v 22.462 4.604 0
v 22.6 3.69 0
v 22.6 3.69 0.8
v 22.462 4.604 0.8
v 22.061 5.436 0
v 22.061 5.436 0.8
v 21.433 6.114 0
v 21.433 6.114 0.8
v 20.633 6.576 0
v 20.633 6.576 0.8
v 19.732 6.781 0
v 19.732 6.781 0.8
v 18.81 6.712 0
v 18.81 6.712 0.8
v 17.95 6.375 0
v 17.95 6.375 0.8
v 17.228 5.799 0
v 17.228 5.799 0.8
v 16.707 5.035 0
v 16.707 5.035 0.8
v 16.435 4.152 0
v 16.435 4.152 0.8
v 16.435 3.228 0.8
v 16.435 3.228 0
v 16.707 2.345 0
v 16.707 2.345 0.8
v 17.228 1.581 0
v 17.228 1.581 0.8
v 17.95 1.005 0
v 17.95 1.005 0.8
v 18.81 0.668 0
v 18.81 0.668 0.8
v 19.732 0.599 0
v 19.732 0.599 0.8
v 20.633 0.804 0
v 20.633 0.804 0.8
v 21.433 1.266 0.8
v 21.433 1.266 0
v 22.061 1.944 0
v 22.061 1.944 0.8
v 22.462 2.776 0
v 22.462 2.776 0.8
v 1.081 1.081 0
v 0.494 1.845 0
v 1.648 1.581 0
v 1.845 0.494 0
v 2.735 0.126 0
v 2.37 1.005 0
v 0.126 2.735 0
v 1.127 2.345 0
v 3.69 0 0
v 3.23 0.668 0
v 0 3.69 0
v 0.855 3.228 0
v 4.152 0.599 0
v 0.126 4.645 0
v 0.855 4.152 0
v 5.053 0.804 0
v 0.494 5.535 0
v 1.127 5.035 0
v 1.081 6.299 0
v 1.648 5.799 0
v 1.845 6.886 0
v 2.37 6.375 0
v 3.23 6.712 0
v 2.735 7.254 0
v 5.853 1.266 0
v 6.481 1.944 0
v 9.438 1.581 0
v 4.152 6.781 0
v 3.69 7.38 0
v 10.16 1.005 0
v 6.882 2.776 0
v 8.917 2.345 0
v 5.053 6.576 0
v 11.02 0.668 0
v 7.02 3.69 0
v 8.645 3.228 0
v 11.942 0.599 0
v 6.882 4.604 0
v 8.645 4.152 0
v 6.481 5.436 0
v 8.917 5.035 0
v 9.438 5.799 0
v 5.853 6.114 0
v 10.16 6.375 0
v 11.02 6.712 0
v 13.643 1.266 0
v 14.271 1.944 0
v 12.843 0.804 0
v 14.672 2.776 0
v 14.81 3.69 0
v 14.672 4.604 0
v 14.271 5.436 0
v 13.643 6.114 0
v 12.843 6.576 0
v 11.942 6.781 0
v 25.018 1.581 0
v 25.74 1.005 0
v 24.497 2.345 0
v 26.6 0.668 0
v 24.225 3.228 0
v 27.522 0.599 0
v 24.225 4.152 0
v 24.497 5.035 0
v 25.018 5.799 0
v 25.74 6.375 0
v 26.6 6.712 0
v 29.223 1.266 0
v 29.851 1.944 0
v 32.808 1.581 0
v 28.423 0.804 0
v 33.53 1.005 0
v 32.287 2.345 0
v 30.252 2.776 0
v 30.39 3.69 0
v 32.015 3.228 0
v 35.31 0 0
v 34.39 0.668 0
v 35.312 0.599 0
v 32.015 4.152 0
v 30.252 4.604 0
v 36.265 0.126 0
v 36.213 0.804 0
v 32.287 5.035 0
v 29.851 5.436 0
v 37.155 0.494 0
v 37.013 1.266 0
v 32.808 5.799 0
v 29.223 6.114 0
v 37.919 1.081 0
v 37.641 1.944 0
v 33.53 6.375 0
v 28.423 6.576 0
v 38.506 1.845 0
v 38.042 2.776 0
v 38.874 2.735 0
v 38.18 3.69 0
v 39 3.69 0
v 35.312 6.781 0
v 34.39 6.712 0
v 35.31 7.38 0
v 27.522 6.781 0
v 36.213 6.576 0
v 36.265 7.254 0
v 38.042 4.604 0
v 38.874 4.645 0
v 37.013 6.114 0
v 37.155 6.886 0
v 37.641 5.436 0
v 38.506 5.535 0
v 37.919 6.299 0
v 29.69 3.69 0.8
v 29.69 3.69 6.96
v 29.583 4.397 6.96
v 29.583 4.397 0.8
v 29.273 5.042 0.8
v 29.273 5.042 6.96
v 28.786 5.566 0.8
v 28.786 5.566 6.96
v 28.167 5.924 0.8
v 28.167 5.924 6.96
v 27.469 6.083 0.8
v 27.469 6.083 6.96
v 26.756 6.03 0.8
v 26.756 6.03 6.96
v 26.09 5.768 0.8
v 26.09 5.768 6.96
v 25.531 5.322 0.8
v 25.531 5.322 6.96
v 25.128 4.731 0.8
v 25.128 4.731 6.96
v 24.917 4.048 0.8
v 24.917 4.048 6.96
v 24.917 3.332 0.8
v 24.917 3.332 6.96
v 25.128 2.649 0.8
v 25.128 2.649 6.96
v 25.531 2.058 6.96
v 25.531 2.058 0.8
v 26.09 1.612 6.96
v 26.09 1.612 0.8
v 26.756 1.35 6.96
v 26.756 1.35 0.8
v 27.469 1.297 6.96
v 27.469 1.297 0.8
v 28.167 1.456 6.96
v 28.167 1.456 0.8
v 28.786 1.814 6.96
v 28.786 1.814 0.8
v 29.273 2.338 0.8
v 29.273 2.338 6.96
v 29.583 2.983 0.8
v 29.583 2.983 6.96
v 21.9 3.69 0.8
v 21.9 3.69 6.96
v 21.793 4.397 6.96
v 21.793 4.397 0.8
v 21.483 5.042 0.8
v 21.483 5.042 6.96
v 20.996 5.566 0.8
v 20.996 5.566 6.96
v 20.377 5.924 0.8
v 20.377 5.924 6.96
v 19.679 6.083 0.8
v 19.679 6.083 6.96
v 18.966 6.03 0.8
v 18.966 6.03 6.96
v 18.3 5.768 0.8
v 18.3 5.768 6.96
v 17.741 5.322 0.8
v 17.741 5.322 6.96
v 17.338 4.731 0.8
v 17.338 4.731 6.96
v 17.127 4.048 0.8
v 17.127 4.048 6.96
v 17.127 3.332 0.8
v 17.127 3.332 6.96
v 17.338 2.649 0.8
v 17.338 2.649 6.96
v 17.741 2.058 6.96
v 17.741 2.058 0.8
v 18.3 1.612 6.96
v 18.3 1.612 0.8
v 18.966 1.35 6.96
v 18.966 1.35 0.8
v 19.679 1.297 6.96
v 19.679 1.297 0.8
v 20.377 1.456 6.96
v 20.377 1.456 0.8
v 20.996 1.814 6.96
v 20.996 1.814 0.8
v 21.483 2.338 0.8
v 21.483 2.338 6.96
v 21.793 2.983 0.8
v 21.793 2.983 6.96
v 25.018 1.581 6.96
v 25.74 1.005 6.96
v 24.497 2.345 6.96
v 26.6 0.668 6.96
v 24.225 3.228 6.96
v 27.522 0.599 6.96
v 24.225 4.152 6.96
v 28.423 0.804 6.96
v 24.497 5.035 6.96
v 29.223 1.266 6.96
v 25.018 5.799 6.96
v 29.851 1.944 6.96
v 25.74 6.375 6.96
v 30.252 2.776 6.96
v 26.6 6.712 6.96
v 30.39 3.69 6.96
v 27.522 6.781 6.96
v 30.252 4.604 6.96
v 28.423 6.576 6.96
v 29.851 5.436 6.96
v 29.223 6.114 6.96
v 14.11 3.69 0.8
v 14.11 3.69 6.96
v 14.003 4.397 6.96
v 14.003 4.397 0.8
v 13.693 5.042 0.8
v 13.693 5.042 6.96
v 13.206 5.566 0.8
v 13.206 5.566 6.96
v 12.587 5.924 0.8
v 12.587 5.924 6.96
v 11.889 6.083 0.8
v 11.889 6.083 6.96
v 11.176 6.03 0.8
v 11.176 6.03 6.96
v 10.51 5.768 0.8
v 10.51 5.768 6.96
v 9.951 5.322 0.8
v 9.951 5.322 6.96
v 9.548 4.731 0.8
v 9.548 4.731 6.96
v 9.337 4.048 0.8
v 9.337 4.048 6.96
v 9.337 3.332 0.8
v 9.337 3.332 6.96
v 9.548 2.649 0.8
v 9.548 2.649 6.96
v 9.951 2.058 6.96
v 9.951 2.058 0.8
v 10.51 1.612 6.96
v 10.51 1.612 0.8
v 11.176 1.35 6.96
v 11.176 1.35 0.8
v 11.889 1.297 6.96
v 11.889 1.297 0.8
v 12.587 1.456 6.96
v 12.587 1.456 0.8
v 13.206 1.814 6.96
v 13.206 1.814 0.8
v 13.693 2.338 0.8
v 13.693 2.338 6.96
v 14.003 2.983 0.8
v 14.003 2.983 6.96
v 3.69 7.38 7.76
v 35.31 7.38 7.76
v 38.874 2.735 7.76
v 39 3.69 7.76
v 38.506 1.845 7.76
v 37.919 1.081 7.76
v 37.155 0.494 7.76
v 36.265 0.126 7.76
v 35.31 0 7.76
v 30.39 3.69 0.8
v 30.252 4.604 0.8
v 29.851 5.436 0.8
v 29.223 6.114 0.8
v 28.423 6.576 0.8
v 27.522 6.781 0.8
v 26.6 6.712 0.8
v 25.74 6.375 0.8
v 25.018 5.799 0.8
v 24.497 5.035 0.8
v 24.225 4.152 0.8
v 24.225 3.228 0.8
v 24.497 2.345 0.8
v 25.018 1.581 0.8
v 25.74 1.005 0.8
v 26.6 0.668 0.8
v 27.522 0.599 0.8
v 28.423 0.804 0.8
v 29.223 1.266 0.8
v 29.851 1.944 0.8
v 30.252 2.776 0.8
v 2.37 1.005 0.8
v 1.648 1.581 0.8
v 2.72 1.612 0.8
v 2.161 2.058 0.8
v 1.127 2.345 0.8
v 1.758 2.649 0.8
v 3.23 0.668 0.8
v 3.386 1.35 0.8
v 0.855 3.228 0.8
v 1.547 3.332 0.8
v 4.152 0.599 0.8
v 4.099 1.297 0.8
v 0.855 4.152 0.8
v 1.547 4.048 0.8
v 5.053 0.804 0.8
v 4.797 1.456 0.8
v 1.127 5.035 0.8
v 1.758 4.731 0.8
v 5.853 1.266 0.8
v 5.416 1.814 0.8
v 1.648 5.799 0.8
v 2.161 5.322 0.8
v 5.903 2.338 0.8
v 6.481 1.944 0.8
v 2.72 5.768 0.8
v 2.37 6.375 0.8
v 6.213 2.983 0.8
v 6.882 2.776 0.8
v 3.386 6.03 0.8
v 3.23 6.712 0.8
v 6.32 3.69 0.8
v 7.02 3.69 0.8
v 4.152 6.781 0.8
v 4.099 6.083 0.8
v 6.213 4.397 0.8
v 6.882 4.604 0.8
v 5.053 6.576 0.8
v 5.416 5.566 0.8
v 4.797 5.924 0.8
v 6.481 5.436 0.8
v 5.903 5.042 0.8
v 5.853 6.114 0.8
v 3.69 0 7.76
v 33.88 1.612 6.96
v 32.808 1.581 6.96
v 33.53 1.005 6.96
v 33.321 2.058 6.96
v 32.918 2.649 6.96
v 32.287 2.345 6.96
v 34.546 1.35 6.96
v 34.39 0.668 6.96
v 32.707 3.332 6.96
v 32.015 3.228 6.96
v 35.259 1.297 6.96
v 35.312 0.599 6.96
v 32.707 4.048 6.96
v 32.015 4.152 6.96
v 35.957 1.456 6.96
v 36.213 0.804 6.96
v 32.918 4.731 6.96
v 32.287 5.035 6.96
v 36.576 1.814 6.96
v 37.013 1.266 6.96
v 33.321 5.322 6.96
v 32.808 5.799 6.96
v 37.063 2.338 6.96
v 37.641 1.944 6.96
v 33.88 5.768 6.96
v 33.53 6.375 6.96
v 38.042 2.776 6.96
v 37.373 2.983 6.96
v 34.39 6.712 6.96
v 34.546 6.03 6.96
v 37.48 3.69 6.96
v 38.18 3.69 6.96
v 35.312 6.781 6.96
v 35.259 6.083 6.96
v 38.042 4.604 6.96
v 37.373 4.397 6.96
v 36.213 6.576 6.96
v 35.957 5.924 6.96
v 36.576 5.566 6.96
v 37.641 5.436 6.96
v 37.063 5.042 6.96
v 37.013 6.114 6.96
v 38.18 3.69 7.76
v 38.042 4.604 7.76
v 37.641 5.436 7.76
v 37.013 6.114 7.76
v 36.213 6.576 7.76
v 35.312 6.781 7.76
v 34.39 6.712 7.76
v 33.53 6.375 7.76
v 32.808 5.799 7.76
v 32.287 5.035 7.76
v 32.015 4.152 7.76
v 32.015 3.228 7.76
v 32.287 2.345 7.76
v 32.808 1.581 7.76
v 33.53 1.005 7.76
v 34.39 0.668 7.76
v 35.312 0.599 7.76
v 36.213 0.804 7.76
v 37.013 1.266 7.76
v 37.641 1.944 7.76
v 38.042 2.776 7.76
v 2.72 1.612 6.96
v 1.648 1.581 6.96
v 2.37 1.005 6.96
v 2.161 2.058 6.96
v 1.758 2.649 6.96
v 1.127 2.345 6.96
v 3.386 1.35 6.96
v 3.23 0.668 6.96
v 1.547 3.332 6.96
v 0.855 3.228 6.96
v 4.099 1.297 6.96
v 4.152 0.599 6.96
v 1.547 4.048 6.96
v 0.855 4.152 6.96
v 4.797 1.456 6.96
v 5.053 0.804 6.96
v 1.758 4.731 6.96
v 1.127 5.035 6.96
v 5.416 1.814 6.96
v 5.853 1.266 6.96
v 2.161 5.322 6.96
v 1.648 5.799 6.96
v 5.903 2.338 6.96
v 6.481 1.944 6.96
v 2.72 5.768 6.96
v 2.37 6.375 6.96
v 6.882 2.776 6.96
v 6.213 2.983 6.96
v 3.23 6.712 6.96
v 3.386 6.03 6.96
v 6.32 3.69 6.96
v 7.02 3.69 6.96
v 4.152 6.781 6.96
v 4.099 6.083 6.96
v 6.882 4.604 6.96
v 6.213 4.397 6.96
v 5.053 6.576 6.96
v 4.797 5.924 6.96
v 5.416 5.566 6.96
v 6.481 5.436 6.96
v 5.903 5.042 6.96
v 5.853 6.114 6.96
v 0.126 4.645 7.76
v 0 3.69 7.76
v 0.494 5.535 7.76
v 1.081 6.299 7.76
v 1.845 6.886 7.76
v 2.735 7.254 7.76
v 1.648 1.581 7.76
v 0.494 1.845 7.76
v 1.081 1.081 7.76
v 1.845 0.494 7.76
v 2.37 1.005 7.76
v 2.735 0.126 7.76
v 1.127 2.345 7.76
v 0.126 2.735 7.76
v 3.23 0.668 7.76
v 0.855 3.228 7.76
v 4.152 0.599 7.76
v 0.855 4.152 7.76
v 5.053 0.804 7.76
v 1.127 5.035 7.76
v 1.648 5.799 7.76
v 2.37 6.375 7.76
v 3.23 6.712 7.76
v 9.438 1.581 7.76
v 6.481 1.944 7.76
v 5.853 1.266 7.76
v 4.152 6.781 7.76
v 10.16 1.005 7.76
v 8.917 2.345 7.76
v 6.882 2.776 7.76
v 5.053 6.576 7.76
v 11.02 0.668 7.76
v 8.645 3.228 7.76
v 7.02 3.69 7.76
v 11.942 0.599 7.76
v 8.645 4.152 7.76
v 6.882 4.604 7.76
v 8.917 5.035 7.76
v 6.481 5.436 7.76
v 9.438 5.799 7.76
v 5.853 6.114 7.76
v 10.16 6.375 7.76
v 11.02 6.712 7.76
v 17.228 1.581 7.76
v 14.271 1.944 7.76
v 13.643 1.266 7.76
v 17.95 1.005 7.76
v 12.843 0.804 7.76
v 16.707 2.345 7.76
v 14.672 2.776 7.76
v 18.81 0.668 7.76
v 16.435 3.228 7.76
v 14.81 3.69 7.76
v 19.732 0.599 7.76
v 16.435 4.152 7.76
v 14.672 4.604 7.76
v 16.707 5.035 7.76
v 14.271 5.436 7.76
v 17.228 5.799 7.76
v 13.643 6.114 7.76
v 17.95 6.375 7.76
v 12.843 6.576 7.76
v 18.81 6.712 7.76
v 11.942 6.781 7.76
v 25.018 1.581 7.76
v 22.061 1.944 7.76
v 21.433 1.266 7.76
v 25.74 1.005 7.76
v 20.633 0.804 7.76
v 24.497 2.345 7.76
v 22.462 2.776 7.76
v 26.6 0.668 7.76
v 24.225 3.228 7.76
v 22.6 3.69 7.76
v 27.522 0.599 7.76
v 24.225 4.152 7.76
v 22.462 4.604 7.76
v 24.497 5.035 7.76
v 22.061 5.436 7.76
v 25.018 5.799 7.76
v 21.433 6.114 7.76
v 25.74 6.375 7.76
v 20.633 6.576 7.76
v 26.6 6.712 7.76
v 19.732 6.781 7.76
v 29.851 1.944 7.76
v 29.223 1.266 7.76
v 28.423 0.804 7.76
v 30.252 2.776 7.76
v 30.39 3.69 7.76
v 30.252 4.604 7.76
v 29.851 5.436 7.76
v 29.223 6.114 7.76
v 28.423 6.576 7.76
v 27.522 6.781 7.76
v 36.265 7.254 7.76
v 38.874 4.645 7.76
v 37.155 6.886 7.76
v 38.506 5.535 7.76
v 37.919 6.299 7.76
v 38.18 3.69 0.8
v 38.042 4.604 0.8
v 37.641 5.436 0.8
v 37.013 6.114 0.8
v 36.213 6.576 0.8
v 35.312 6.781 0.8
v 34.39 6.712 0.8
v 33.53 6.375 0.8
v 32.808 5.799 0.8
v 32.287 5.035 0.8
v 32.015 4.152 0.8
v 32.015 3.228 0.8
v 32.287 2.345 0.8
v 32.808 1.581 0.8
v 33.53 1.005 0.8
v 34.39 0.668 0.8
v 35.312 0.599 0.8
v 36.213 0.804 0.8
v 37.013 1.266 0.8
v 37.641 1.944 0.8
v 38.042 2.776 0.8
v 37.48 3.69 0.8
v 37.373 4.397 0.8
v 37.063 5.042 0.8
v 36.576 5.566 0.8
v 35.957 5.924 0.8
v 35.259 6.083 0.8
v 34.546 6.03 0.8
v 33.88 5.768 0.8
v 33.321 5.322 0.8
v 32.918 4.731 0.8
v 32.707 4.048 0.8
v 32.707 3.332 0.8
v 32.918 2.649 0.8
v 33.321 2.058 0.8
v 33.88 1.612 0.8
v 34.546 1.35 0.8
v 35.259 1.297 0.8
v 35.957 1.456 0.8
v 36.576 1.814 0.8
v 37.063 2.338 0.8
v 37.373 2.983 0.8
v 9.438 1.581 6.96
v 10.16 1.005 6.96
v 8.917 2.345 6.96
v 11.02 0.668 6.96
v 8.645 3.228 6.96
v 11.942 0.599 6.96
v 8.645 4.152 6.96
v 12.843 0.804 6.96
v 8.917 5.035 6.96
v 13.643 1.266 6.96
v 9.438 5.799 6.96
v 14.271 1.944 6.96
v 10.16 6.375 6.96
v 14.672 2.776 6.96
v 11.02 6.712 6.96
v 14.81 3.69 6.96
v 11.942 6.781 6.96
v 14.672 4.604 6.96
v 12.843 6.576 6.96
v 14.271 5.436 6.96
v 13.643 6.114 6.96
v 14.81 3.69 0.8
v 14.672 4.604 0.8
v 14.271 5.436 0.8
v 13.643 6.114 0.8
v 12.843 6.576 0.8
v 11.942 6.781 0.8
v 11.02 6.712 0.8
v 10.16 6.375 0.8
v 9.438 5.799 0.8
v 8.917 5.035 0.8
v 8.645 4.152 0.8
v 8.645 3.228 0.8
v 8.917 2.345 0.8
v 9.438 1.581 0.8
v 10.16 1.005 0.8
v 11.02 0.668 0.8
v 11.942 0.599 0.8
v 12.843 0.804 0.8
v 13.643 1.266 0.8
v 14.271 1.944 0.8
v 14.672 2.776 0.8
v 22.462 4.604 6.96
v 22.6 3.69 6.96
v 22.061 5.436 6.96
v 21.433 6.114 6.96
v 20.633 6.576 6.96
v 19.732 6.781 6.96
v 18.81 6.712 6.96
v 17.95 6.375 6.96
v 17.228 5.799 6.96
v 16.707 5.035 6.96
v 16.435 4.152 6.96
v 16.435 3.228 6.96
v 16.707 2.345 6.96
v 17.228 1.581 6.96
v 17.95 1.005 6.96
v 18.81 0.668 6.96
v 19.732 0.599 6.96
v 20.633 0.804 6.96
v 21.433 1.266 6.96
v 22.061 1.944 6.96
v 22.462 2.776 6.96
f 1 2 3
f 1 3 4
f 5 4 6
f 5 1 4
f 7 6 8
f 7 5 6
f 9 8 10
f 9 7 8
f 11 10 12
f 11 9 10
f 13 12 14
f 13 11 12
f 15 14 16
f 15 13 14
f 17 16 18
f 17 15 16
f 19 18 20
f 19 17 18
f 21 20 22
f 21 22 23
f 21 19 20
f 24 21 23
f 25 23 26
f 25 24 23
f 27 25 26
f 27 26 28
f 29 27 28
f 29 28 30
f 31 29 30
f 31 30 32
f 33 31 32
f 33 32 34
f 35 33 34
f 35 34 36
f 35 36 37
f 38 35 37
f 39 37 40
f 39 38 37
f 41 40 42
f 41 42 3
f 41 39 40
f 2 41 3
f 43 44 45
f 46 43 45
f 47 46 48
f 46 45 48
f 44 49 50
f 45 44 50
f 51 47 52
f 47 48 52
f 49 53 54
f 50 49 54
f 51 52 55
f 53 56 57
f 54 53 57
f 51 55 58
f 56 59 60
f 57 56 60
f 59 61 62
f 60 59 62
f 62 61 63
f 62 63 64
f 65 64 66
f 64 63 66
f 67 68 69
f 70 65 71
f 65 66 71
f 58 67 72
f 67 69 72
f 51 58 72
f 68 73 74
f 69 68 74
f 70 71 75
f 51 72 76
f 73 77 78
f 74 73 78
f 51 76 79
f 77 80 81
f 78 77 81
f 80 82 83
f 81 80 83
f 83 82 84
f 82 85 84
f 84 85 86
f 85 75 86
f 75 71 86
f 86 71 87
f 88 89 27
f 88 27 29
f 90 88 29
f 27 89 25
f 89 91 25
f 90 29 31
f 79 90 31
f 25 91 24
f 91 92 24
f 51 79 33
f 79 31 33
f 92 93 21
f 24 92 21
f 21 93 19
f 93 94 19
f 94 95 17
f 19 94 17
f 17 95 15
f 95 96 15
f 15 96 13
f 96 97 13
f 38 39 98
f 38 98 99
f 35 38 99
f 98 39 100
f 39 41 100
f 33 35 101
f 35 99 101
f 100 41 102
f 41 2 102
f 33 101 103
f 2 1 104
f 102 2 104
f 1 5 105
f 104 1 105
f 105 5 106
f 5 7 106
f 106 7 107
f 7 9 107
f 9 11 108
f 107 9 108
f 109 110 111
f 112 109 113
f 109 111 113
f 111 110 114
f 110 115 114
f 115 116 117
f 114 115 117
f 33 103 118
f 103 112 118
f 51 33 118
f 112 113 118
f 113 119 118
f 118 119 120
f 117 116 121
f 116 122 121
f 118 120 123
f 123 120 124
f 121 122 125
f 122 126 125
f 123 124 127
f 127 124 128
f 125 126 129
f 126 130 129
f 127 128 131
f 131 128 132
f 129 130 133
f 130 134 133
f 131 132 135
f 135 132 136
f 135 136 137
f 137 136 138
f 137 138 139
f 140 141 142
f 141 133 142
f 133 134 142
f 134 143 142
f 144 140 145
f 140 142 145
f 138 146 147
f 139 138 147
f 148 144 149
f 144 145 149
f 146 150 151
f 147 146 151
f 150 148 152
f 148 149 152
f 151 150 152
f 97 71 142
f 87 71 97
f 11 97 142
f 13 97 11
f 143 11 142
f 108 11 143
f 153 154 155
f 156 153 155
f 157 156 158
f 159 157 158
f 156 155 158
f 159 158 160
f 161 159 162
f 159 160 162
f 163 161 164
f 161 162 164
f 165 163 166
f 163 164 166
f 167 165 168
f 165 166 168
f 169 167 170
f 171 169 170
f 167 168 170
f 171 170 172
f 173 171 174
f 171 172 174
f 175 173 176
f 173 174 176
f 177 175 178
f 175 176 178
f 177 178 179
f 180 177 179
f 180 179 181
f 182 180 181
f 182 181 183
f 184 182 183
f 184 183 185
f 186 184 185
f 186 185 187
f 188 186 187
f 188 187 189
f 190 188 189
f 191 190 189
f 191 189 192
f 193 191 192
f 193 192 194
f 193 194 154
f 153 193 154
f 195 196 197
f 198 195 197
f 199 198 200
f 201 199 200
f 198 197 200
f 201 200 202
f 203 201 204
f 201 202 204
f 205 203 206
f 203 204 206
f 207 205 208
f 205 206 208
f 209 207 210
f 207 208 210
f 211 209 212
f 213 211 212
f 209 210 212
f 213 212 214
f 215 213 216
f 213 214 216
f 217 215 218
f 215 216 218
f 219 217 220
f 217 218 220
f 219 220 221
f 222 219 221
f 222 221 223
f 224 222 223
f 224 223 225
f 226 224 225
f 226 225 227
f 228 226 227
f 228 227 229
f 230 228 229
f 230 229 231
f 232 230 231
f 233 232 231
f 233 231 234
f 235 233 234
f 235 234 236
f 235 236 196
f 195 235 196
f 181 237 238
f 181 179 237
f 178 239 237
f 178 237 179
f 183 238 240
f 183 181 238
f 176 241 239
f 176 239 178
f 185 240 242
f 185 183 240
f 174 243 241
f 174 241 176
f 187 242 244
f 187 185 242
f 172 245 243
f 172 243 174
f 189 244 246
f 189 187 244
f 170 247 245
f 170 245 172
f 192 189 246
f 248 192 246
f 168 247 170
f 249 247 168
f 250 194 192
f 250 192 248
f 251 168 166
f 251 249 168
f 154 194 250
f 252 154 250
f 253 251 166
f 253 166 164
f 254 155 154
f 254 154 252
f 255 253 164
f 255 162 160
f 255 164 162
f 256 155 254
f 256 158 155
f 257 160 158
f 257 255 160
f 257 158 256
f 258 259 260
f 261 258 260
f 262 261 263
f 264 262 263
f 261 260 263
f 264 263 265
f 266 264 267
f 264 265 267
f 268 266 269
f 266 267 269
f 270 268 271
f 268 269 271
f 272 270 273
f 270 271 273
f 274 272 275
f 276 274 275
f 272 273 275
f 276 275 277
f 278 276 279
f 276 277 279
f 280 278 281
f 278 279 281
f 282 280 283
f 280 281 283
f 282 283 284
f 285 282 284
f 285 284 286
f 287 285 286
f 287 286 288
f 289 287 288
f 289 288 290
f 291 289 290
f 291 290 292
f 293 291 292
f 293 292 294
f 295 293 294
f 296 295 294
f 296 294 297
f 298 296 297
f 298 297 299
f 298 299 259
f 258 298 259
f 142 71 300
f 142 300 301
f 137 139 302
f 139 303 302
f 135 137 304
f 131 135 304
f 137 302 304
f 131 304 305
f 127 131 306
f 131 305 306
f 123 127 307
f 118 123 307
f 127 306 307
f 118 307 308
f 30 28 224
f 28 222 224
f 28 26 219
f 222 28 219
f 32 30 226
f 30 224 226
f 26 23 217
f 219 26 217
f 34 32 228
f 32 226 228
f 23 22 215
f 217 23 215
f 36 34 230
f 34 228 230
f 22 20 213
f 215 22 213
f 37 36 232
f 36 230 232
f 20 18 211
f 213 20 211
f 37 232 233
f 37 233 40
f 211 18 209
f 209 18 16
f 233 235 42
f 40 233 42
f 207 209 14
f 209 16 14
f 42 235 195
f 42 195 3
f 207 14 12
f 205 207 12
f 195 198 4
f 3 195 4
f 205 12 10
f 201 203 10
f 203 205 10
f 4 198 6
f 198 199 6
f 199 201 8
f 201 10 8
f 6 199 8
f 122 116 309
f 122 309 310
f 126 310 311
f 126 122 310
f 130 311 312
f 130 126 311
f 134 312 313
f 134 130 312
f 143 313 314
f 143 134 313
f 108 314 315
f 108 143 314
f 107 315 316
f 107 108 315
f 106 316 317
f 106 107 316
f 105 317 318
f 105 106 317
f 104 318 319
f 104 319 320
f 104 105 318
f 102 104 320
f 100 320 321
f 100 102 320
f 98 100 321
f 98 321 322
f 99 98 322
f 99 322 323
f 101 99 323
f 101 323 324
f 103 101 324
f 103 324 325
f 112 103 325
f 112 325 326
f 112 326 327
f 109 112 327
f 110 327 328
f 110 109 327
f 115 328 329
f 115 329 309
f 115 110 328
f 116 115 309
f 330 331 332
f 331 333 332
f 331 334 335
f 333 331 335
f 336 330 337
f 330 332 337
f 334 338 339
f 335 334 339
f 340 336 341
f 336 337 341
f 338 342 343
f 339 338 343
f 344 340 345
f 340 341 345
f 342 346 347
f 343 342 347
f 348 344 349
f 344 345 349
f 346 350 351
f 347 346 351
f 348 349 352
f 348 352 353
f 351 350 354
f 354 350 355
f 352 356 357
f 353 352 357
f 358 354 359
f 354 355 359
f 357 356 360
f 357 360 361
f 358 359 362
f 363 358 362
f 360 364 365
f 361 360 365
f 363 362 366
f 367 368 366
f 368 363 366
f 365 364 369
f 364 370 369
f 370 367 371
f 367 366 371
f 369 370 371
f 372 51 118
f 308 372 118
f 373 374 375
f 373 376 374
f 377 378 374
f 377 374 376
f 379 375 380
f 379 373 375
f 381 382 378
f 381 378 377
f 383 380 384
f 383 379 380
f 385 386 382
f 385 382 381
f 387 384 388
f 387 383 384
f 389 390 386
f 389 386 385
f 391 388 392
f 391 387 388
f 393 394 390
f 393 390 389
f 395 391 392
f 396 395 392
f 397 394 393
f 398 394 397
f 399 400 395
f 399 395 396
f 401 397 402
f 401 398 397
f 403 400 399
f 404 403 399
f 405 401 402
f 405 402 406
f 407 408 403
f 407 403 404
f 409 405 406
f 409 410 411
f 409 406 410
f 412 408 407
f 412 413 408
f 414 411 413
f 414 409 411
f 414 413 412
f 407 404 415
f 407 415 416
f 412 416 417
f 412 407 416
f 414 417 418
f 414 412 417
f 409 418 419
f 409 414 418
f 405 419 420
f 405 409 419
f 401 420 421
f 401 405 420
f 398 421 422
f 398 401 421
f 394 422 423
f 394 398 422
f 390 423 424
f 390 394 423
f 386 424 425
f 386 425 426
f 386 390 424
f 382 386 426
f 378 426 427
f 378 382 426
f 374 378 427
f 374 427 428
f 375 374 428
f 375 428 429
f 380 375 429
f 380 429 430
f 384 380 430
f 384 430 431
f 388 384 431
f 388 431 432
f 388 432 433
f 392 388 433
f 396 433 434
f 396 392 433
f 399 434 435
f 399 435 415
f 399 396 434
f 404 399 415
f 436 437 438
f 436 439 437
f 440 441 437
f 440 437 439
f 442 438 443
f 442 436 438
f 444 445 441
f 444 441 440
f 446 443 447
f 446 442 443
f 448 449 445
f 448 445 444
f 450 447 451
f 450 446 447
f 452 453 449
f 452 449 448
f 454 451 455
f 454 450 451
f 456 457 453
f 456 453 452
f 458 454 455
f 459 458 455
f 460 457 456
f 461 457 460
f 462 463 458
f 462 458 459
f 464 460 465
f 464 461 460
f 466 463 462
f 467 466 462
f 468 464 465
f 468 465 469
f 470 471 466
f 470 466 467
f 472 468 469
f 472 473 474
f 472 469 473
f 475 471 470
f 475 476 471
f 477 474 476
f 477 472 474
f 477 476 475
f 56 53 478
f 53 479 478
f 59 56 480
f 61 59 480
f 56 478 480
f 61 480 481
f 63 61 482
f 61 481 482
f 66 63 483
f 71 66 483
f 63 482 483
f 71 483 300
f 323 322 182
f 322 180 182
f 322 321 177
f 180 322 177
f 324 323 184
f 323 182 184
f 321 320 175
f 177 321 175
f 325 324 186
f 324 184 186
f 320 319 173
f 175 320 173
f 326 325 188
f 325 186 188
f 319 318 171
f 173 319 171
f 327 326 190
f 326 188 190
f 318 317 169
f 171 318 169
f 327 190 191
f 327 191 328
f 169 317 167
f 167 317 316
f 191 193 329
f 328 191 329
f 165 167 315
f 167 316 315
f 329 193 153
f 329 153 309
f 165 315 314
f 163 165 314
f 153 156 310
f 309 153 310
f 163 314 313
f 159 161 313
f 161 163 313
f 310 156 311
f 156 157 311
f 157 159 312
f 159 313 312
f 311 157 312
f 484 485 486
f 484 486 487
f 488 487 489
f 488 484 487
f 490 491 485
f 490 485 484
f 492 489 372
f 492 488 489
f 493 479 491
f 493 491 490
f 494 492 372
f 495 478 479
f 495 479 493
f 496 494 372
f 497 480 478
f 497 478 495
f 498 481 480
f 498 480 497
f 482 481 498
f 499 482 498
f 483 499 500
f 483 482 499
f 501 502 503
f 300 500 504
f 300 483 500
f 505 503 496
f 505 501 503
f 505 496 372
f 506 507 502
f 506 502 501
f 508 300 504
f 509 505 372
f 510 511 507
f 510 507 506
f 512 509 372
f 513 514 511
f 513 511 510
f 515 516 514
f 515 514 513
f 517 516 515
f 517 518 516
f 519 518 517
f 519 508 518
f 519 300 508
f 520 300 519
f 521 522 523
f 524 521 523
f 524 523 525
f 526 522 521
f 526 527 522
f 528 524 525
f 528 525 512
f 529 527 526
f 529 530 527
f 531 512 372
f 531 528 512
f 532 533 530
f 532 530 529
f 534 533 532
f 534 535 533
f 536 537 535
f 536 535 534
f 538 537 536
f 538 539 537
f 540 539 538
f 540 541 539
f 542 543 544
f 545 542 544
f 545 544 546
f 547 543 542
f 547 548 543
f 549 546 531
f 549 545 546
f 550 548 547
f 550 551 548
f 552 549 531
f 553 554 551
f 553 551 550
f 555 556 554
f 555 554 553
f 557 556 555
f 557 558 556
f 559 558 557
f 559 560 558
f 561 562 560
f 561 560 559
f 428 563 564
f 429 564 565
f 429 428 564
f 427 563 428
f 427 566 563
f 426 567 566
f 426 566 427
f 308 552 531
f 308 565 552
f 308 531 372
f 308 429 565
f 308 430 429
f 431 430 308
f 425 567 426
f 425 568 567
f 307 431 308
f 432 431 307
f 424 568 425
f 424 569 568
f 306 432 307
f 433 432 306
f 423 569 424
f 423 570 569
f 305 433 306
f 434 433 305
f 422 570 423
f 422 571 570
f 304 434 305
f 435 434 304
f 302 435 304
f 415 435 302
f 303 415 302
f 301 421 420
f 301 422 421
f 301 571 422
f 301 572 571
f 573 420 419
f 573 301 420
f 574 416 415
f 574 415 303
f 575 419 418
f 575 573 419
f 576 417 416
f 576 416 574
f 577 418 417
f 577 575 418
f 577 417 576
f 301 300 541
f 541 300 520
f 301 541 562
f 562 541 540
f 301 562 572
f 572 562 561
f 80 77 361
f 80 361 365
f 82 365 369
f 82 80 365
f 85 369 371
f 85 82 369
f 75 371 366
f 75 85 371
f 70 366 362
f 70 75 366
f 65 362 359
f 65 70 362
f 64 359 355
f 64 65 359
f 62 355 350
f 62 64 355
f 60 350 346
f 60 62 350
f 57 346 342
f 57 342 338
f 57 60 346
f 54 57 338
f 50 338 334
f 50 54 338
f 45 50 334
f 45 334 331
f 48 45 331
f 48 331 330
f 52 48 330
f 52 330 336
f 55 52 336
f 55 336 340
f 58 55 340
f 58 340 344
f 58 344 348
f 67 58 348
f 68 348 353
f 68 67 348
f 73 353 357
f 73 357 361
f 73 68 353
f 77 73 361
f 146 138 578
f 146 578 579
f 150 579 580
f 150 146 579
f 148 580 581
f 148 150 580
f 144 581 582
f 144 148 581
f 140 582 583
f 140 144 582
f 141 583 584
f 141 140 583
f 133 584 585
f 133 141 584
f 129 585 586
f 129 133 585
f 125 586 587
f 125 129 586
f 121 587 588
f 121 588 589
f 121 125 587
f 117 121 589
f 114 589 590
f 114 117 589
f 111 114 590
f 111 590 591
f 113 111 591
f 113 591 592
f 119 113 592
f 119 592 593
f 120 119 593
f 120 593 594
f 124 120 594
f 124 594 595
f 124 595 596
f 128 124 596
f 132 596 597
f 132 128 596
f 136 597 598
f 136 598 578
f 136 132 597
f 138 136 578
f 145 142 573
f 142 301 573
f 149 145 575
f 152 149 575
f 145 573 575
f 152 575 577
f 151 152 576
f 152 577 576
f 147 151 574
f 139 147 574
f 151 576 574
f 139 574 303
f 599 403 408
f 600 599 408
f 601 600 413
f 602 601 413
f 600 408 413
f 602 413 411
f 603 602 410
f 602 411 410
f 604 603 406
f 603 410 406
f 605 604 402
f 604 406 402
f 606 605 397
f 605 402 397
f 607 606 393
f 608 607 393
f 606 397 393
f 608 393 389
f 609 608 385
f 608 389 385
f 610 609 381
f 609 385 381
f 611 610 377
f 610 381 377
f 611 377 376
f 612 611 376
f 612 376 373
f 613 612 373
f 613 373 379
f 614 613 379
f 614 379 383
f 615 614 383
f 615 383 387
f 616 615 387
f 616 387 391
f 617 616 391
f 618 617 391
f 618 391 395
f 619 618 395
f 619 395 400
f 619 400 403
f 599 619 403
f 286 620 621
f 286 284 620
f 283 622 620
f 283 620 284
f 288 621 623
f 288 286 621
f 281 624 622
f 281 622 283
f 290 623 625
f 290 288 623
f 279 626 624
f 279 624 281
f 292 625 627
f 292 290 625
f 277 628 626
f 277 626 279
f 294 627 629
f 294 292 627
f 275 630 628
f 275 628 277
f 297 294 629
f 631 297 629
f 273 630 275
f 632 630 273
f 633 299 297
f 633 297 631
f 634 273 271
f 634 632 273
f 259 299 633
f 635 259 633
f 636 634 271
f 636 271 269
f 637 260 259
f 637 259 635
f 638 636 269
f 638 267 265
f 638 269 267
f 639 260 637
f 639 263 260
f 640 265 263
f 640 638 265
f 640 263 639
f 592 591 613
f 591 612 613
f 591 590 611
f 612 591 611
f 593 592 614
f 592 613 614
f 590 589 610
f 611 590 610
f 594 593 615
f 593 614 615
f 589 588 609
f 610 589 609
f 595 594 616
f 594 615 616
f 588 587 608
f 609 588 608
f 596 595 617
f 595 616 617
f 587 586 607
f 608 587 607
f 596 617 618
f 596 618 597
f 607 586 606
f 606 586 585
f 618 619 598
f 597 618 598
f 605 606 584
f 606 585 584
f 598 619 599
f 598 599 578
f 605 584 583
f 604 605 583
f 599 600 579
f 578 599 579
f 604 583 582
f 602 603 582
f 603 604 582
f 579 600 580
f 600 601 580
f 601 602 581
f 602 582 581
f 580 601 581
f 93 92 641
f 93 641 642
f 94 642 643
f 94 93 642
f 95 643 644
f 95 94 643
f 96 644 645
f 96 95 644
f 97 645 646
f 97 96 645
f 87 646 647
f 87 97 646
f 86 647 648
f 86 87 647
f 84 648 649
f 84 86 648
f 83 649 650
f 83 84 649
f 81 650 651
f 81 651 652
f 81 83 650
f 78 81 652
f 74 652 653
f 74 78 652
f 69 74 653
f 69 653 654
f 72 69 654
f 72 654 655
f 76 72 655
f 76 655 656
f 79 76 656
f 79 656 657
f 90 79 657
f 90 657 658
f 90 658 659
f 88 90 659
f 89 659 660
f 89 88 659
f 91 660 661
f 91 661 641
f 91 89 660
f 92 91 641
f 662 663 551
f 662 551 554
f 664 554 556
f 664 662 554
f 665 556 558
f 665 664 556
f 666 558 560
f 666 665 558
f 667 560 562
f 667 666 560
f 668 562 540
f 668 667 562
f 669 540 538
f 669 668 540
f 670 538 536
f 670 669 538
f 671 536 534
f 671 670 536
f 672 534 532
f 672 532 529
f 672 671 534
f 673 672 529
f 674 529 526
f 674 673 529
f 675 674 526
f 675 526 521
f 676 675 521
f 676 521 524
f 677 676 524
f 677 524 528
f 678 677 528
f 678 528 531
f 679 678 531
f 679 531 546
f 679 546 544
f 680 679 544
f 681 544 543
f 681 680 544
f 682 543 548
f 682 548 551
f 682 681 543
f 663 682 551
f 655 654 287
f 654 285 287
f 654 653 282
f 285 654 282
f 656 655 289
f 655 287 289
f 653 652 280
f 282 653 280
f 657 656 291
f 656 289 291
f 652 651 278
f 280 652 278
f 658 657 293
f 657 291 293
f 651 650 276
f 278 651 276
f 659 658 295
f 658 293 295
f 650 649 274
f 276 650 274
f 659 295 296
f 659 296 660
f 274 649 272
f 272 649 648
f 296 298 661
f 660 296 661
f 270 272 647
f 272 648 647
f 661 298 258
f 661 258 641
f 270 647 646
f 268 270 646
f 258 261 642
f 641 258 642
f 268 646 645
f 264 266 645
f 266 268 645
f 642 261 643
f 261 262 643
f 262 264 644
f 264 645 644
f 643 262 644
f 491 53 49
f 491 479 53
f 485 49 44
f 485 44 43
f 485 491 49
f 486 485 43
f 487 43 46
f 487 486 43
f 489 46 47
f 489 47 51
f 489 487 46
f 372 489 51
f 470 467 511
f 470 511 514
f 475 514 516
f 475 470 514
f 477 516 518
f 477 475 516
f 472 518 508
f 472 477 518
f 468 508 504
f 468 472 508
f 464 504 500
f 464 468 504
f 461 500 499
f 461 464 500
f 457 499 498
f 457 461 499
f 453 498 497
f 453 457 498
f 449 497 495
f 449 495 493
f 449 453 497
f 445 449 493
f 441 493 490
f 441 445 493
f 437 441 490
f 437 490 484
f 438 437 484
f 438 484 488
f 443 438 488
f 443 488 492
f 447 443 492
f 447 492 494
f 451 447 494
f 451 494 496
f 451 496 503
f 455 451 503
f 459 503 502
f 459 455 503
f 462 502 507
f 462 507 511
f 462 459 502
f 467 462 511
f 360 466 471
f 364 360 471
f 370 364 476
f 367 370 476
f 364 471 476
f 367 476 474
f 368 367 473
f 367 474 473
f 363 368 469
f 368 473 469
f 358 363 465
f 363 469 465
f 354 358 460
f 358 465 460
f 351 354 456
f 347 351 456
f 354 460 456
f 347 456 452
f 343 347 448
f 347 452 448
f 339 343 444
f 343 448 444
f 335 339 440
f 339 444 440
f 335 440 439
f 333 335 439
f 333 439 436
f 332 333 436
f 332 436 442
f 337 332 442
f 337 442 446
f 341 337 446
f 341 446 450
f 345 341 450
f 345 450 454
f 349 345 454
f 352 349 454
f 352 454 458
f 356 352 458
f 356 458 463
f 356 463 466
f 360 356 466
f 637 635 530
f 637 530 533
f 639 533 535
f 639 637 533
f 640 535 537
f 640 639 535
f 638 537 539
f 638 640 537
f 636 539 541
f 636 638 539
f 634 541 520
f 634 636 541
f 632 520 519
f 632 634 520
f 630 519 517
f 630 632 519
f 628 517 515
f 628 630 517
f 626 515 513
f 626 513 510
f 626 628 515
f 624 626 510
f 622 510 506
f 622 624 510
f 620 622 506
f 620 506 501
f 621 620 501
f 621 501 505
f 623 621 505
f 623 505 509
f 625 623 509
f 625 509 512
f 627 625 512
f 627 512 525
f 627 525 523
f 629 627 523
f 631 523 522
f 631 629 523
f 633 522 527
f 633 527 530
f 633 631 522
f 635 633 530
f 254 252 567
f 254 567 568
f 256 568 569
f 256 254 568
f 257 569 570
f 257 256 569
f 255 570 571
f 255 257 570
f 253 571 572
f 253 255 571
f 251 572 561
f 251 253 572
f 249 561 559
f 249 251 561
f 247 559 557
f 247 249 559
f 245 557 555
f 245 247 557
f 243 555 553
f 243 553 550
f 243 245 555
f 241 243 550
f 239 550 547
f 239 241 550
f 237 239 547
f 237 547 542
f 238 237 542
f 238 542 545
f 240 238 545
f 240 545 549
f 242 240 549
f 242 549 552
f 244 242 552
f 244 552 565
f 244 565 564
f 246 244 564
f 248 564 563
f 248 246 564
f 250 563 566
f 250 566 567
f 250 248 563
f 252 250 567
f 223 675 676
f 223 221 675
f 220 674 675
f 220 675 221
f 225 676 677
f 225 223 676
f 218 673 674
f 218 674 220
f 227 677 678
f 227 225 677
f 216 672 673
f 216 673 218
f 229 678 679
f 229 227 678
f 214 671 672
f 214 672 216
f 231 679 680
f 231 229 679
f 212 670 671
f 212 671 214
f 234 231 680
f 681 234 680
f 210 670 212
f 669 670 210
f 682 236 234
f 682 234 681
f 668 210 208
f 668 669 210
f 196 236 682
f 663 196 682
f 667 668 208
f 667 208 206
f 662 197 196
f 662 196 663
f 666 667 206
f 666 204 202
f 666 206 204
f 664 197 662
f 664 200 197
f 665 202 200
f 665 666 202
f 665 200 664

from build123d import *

# Parameters (mm, degrees)
SKETCH1_W                = 39
SKETCH1_H                = 7.38
BOSS_EXTRUDE1_DEPTH      = 7.76
SKETCH2_R                = 2.4
CUT_EXTRUDE1_DEPTH       = 7.76
CUT_EXTRUDE2_OUTLINE_R   = 3.1
CUT_EXTRUDE2_OUTLINE_R_2 = 2.4
CUT_EXTRUDE2_DEPTH       = 0.8
CUT_EXTRUDE3_START       = 6.96
CUT_EXTRUDE3_OUTLINE_R   = 3.1
CUT_EXTRUDE3_OUTLINE_R_2 = 2.4
CUT_EXTRUDE3_DEPTH       = 0.8
LPATTERN3_COUNT          = 3
LPATTERN3_PITCH          = 7.79
LPATTERN6_COUNT          = 3
LPATTERN6_PITCH          = 7.79
FILLET1_R                = 3.69
FILLET2_R                = 3.69
FILLET3_R                = 3.69
FILLET4_R                = 3.69


# Read off the part's stored shape, not the designer's step: Cut-Extrude2, Cut-Extrude3
with BuildPart() as part:
    # Sketch1 → Boss-Extrude1 (new body)
    with BuildSketch(Plane.XY):
        with Locations((19.5, 3.69)):
            Rectangle(SKETCH1_W, SKETCH1_H)
    extrude(amount=BOSS_EXTRUDE1_DEPTH)

    # Sketch2 → Cut-Extrude1 (cut)
    with BuildSketch(Plane.XY.offset(7.76)):
        with Locations((19.5, 3.69)):
            Circle(SKETCH2_R)
    cut_extrude1 = extrude(amount=-CUT_EXTRUDE1_DEPTH, mode=Mode.SUBTRACT)

    # Cut-Extrude2 outline → Cut-Extrude2 (cut)
    with BuildSketch(Plane.XY):
        with Locations((19.5, 3.69)):
            Circle(CUT_EXTRUDE2_OUTLINE_R)
        with Locations((19.5, 3.69)):
            Circle(CUT_EXTRUDE2_OUTLINE_R_2, mode=Mode.SUBTRACT)
    cut_extrude2 = extrude(amount=CUT_EXTRUDE2_DEPTH, mode=Mode.SUBTRACT)

    # Cut-Extrude3 outline → Cut-Extrude3 (cut)
    with BuildSketch(Plane.XY.offset(CUT_EXTRUDE3_START)):
        with Locations((19.5, 3.69)):
            Circle(CUT_EXTRUDE3_OUTLINE_R)
        with Locations((19.5, 3.69)):
            Circle(CUT_EXTRUDE3_OUTLINE_R_2, mode=Mode.SUBTRACT)
    cut_extrude3 = extrude(amount=CUT_EXTRUDE3_DEPTH, mode=Mode.SUBTRACT)

    # LPattern3: Cut-Extrude1, Cut-Extrude2, Cut-Extrude3 ×3
    with Locations(*[(-i * LPATTERN3_PITCH, 0, 0) for i in range(1, LPATTERN3_COUNT)]):
        add(cut_extrude1, mode=Mode.SUBTRACT)
        add(cut_extrude2, mode=Mode.SUBTRACT)
        add(cut_extrude3, mode=Mode.SUBTRACT)

    # LPattern6: Cut-Extrude1, Cut-Extrude2, Cut-Extrude3 ×3
    with Locations(*[(i * LPATTERN6_PITCH, 0, 0) for i in range(1, LPATTERN6_COUNT)]):
        add(cut_extrude1, mode=Mode.SUBTRACT)
        add(cut_extrude2, mode=Mode.SUBTRACT)
        add(cut_extrude3, mode=Mode.SUBTRACT)

    # Fillet1
    fillet1_edges = [part.edges().sort_by_distance(p)[0] for p in [
        (0, 7.38, 3.88),
    ]]
    fillet(fillet1_edges, radius=FILLET1_R)

    # Fillet2
    fillet2_edges = [part.edges().sort_by_distance(p)[0] for p in [
        (0, 0, 3.88),
    ]]
    fillet(fillet2_edges, radius=FILLET2_R - 0.0001)  # a hair under: the kernel refuses the full size

    # Fillet3
    fillet3_edges = [part.edges().sort_by_distance(p)[0] for p in [
        (39, 7.38, 3.88),
    ]]
    fillet(fillet3_edges, radius=FILLET3_R)

    # Fillet4
    fillet4_edges = [part.edges().sort_by_distance(p)[0] for p in [
        (39, 0, 3.88),
    ]]
    fillet(fillet4_edges, radius=FILLET4_R - 0.0001)  # a hair under: the kernel refuses the full size


solid = part.part
